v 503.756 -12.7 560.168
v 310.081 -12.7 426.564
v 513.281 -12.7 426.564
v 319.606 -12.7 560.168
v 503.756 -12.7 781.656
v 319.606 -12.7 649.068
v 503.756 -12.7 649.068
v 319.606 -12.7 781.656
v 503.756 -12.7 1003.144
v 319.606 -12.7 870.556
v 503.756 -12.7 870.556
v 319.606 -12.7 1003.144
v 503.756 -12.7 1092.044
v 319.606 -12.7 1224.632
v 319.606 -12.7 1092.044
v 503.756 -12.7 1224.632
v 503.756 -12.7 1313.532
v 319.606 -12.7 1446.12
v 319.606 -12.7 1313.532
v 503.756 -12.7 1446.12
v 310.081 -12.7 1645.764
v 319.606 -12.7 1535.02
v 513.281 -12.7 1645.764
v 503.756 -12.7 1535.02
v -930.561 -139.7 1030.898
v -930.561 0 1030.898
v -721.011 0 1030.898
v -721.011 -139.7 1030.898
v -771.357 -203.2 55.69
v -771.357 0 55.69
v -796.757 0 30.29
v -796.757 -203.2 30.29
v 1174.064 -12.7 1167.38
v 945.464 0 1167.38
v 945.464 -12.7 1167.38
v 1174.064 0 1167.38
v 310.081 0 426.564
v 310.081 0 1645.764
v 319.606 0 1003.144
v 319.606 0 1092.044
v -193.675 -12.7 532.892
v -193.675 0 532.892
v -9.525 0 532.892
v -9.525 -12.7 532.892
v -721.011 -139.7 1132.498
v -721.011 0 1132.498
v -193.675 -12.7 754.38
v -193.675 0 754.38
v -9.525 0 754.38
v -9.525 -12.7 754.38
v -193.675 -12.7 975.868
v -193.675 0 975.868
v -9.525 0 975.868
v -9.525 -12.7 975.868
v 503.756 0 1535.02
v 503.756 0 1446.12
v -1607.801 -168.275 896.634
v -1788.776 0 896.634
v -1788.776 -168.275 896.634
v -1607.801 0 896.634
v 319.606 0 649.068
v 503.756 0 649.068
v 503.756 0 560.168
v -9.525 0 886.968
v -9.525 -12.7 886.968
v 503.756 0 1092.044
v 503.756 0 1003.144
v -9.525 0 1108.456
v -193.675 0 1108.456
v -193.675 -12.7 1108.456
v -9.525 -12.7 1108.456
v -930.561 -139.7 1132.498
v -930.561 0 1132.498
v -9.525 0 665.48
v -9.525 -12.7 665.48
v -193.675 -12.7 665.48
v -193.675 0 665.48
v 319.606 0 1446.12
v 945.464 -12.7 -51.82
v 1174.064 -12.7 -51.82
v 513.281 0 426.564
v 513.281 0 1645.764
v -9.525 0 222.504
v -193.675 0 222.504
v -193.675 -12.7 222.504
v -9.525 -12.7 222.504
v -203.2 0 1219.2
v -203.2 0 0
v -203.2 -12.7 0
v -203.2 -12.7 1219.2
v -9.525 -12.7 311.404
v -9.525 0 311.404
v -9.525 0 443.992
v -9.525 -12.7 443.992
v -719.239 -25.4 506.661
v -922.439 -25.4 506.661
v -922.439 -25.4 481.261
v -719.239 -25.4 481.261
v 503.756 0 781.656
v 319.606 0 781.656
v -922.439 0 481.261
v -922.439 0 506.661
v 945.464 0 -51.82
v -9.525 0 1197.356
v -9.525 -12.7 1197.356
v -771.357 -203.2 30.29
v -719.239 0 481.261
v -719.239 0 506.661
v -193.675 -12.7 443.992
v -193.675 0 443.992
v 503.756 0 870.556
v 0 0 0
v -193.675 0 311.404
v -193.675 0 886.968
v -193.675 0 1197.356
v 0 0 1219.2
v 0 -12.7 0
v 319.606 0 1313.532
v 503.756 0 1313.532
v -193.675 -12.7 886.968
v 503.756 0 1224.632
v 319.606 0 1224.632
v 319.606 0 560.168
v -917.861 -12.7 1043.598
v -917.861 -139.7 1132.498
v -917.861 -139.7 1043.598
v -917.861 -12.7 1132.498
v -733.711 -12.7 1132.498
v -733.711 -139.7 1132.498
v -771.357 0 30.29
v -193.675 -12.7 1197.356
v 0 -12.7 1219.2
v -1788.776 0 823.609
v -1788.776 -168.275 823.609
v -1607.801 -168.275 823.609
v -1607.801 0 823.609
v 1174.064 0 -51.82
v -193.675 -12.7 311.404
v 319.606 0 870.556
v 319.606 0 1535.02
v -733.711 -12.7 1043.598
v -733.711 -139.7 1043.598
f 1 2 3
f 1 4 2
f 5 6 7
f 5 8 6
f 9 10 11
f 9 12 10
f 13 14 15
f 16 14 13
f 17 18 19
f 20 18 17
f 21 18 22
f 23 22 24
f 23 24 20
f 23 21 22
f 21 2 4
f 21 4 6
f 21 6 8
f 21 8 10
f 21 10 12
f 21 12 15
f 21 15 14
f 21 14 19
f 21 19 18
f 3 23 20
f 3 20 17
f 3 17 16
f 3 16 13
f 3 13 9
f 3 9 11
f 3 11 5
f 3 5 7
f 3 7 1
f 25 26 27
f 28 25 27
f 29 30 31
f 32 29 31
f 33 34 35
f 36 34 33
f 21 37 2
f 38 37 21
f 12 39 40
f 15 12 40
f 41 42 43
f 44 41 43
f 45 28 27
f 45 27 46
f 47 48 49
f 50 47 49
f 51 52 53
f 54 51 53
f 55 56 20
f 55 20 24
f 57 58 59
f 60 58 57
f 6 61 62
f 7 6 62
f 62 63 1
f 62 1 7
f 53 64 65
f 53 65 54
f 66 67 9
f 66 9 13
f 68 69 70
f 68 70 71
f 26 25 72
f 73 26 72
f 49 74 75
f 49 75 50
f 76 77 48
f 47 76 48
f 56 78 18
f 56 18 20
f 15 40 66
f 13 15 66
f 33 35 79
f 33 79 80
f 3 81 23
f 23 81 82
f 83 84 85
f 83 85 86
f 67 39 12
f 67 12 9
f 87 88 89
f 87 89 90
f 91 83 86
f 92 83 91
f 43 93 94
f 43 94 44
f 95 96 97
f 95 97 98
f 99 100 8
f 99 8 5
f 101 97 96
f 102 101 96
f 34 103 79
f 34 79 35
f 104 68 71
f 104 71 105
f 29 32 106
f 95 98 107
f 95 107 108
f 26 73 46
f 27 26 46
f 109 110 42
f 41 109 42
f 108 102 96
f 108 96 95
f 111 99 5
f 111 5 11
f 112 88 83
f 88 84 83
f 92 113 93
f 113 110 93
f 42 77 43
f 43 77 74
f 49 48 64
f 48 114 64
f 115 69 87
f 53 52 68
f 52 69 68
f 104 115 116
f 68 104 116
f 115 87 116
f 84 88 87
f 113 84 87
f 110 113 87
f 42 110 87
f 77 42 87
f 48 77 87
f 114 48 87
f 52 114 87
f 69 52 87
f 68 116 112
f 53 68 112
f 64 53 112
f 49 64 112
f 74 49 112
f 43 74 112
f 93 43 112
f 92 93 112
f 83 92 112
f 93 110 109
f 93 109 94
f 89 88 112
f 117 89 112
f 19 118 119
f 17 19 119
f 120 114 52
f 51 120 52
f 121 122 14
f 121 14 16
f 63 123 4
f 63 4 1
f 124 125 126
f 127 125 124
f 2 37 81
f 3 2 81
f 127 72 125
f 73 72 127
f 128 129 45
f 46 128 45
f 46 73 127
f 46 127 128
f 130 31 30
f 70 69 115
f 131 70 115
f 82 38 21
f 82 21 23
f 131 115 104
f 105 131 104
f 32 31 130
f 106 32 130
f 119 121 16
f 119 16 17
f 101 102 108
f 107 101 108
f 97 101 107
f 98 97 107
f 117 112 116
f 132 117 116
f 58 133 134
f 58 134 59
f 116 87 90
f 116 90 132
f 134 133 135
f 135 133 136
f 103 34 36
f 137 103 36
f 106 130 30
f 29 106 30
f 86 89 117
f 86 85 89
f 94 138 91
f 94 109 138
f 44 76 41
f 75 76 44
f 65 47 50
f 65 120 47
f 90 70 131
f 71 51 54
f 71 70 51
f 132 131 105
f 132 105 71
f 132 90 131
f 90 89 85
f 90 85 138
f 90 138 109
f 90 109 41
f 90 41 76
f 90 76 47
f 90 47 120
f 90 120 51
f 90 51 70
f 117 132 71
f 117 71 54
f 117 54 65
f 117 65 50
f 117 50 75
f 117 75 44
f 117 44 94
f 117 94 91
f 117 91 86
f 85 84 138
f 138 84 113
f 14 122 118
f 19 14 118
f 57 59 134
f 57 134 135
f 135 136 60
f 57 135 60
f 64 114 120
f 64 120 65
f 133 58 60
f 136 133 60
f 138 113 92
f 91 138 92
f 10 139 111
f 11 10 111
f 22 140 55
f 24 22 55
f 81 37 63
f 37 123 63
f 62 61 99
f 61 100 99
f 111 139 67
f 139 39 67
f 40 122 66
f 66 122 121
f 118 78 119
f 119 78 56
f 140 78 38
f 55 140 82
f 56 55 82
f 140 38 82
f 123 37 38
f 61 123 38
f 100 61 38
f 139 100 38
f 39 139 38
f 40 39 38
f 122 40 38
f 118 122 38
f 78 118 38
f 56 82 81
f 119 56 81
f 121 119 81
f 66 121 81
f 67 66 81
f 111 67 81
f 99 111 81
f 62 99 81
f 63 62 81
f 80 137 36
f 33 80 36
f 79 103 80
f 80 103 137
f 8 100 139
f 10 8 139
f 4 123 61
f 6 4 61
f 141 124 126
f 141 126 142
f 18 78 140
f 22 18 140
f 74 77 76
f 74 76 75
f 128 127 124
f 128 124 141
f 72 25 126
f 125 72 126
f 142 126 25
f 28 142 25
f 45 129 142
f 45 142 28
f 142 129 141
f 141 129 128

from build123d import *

# Parameters (mm, degrees)
F0_W      = 203.2
F0_H      = 1219.2
F0_W_2    = 184.15
F0_H_2    = 88.9
F1_DEPTH  = 12.7
F2_W      = 203.2
F2_H      = 1219.2
F2_W_2    = 184.15
F2_H_2    = 88.9
F3_DEPTH  = 12.7
F4_W      = 209.55
F4_H      = 101.6
F5_DEPTH  = 139.7
F6_W      = 184.15
F6_H      = 127
F7_DEPTH  = 88.9
F8_W      = 203.2
F8_H      = 25.4
F9_DEPTH  = 25.4
F10_W     = 180.975
F10_H     = 73.025
F11_DEPTH = 168.275
F12_W     = 228.6
F12_H     = 1219.2
F13_DEPTH = 12.7
F15_DEPTH = 203.2


with BuildPart() as f1:
    # F0 (on Front) → F1 (new body)
    with BuildSketch(Plane.XZ):
        with Locations((-101.6, 609.6)):
            Rectangle(F0_W, F0_H)
        with Locations((-101.6, 266.954)):
            Rectangle(F0_W_2, F0_H_2, mode=Mode.SUBTRACT)
        with Locations((-101.6, 488.442)):
            Rectangle(F0_W_2, F0_H_2, mode=Mode.SUBTRACT)
        with Locations((-101.6, 709.93)):
            Rectangle(F0_W_2, F0_H_2, mode=Mode.SUBTRACT)
        with Locations((-101.6, 931.418)):
            Rectangle(F0_W_2, F0_H_2, mode=Mode.SUBTRACT)
        with Locations((-101.6, 1152.906)):
            Rectangle(F0_W_2, F0_H_2, mode=Mode.SUBTRACT)
    extrude(amount=F1_DEPTH)


with BuildPart() as f3:
    # F2 (on Front) → F3 (new body)
    with BuildSketch(Plane.XZ):
        with Locations((411.681328, 1036.164237)):
            Rectangle(F2_W, F2_H)
        with Locations((411.681328, 604.618237)):
            Rectangle(F2_W_2, F2_H_2, mode=Mode.SUBTRACT)
        with Locations((411.681328, 826.106237)):
            Rectangle(F2_W_2, F2_H_2, mode=Mode.SUBTRACT)
        with Locations((411.681328, 1047.594237)):
            Rectangle(F2_W_2, F2_H_2, mode=Mode.SUBTRACT)
        with Locations((411.681328, 1269.082237)):
            Rectangle(F2_W_2, F2_H_2, mode=Mode.SUBTRACT)
        with Locations((411.681328, 1490.570237)):
            Rectangle(F2_W_2, F2_H_2, mode=Mode.SUBTRACT)
    extrude(amount=F3_DEPTH)


with BuildPart() as f5:
    # F4 (on Front) → F5 (new body)
    with BuildSketch(Plane.XZ):
        with Locations((-825.785748, 1081.697557)):
            Rectangle(F4_W, F4_H)
    extrude(amount=F5_DEPTH)

    # F6 (on face) → F7 (cut)
    with BuildSketch(Plane.XY.offset(1132.497557)):
        with Locations((-825.785748, -76.2)):
            Rectangle(F6_W, F6_H)
    extrude(amount=-F7_DEPTH, mode=Mode.SUBTRACT)


with BuildPart() as f9:
    # F8 (on Front) → F9 (new body)
    with BuildSketch(Plane.XZ):
        with Locations((-820.838779, 493.960952)):
            Rectangle(F8_W, F8_H)
    extrude(amount=F9_DEPTH)


with BuildPart() as f11:
    # F10 (on Front) → F11 (new body)
    with BuildSketch(Plane.XZ):
        with Locations((-1698.288881, 860.121931)):
            Rectangle(F10_W, F10_H)
    extrude(amount=F11_DEPTH)


with BuildPart() as f13:
    # F12 (on Front) → F13 (new body)
    with BuildSketch(Plane.XZ):
        with Locations((1059.763619, 557.78036)):
            Rectangle(F12_W, F12_H)
    extrude(amount=F13_DEPTH)


with BuildPart() as f15:
    # F14 (on Front) → F15 (new body)
    with BuildSketch(Plane.XZ):
        Polygon((-771.356804, 30.289914), (-771.356804, 55.689914), (-796.756804, 30.289914), align=None)
    extrude(amount=F15_DEPTH)


solid = Compound([f1.part, f3.part, f5.part, f9.part, f11.part, f13.part, f15.part])
